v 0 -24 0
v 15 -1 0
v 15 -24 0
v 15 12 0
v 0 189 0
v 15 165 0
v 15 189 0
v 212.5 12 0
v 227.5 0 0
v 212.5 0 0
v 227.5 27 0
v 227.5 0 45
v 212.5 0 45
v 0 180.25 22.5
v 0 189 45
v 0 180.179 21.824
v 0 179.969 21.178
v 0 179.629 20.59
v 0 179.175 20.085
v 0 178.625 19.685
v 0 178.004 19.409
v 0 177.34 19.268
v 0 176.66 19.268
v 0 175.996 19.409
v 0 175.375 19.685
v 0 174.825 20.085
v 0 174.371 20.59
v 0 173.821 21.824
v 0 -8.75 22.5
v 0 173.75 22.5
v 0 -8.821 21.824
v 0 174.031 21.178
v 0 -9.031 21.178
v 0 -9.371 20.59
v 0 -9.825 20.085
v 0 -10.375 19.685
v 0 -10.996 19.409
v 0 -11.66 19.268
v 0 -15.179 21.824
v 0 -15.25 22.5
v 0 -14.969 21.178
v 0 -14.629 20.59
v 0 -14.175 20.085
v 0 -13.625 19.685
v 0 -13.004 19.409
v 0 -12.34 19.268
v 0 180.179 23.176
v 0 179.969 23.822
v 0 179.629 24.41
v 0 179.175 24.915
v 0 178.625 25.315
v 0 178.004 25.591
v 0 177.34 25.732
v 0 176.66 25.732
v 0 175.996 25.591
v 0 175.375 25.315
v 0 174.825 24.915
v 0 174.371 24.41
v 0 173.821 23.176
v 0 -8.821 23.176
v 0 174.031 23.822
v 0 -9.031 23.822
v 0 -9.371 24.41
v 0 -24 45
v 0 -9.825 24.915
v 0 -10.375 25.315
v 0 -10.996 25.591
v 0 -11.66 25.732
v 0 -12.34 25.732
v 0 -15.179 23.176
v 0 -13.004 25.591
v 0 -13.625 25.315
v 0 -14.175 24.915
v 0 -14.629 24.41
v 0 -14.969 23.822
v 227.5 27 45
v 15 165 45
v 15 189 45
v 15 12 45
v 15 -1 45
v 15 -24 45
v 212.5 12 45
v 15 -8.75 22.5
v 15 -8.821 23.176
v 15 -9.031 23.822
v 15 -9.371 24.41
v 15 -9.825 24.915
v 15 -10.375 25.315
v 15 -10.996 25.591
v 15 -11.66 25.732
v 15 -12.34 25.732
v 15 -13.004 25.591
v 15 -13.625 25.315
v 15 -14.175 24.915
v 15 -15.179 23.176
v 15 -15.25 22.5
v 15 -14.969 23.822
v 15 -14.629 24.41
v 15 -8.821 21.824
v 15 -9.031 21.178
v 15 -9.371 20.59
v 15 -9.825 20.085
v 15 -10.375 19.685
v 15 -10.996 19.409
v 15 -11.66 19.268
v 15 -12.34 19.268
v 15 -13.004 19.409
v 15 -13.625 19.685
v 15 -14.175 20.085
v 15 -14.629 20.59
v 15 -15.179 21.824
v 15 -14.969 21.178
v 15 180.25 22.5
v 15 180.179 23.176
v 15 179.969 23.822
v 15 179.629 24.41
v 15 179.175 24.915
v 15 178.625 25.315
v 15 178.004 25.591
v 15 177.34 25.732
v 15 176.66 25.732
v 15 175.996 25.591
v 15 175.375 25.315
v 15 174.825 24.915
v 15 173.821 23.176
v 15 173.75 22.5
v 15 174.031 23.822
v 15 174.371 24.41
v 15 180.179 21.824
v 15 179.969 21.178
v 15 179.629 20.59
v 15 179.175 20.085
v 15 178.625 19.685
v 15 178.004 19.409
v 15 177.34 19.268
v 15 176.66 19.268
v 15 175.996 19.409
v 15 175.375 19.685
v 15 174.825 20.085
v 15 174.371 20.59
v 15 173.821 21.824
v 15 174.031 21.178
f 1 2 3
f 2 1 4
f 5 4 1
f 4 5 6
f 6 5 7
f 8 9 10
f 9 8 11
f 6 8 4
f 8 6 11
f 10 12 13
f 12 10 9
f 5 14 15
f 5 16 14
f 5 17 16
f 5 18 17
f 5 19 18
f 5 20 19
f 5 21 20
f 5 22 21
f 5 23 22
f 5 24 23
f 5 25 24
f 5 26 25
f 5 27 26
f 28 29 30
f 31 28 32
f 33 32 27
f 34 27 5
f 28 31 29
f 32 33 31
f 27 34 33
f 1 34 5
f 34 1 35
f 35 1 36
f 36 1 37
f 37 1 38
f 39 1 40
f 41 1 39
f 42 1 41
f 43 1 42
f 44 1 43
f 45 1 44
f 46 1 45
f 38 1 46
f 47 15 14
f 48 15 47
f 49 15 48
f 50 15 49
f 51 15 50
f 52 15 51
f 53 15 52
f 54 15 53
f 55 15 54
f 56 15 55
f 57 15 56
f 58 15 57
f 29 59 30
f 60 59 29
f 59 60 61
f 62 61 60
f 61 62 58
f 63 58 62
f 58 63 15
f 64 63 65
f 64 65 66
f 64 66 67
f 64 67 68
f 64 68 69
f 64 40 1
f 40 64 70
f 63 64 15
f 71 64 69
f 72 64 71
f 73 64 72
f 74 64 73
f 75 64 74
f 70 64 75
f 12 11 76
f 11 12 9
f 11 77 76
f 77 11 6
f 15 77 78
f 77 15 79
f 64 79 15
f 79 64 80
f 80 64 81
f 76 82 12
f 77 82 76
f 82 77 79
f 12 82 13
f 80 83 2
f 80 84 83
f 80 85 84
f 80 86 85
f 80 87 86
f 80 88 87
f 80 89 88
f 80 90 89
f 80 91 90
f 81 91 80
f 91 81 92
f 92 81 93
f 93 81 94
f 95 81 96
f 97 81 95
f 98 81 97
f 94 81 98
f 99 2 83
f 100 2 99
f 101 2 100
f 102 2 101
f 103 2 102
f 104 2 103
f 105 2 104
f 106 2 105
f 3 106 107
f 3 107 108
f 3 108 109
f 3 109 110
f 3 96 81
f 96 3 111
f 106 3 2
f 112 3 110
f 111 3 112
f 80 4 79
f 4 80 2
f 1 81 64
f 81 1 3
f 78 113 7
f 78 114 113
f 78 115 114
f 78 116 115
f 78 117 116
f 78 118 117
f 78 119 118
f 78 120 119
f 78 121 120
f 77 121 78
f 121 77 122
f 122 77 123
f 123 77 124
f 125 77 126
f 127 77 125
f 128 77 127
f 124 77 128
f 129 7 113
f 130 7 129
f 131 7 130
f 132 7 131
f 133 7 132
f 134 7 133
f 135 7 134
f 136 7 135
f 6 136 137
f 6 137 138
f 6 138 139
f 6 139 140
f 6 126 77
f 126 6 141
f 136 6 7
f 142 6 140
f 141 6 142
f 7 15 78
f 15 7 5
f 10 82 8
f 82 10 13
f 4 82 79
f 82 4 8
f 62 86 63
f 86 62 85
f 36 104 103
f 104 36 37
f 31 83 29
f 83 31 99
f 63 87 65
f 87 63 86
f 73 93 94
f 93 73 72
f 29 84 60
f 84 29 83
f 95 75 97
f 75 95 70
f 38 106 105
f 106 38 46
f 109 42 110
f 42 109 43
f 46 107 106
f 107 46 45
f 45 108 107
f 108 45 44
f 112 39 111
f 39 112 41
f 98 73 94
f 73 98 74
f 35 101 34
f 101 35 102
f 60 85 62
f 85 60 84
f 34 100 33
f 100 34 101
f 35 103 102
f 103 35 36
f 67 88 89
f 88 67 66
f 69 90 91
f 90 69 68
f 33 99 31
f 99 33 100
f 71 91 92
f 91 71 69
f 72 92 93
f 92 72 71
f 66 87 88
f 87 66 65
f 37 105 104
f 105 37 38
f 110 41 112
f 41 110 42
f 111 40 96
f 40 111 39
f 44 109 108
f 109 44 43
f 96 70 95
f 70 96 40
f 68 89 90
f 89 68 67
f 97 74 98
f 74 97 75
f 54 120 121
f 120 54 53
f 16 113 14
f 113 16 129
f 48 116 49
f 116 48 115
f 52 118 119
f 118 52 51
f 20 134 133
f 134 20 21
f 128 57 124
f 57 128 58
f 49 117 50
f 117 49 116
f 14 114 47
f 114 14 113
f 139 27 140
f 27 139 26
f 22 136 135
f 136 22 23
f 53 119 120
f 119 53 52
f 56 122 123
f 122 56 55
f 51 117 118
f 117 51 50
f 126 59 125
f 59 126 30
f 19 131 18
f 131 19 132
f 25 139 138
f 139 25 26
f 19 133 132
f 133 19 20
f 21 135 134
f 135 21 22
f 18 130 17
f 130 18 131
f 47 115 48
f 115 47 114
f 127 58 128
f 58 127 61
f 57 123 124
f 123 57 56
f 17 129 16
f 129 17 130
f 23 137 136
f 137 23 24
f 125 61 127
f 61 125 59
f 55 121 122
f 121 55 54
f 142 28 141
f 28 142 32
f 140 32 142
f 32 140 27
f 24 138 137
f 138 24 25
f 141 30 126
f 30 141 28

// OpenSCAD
/*
  Floor Tile Shelf Bracket / Support
  Version: HEAVY-DUTY SOLID WEDGE + MINIMAL MOUNTING TABS
  Optimized size: 227.5 x 213 mm (Fits a 235x235 bed at 100% scale)
*/

// ==========================================
// --- TILE AND POSITIONING PARAMETERS ---
// ==========================================
tile_nominal_width = 195;    // Nominal width of the tile (19.5 cm)
shrinkage_clearance = 2.5;   // Plastic shrinkage compensation / tolerance
tile_width = tile_nominal_width + shrinkage_clearance; 
tile_thickness = 10;         // Thickness of the tile (1 cm)

// ==========================================
// --- BRACKET DESIGN PARAMETERS ---
// ==========================================
bracket_width = 45;          // Overall width/thickness of the printed bracket (4.5 cm) 
wall_base_thickness = 15;    // Thickness of the base resting against the wall

// Tile sits flush with the back section
wall_offset = wall_base_thickness; 

front_arm_thickness = 27;    // Thickness of the base at the very front (under the retaining lip)
recess_depth = 12;           // Depth of the groove holding the tile
front_lip = 15;              // Front retaining lip to secure the tile in place

// --- NEW PROPORTIONS (SOLID WEDGE) ---
wedge_height = 165;          // Height of the main supporting wedge against the wall
top_tab_height = 24;         // Minimal top mounting tab (just enough for the washer/hole)
bottom_tab_height = 24;      // Minimal bottom mounting tab (just enough for the washer/hole)

// ==========================================
// --- SCREW MOUNTING PARAMETERS ---
// ==========================================
hole_diameter = 6.5;         // Large hole for a 6mm screw with a flat washer
hole_margin = 12;            // Safe distance from the hole center to the edge of the tab

// --- AUXILIARY CALCULATIONS ---
total_length = wall_offset + tile_width + front_lip;

// Model rotated on its side (ready for 3D printing)
rotate([90, 0, 0])
shelf_bracket();

// ==========================================
// --- MAIN GENERATOR MODULE ---
// ==========================================
module shelf_bracket() {
    difference() {
        // 1. MAIN BODY (MASSIVE WEDGE + MOUNTING TABS)
        union() {
            // MAIN SUPPORT WEDGE (Covers the entire space under the tile)
            hull() {
                // Wall block (from the flat top to the very bottom of the wedge)
                translate([0, 0, -wedge_height])
                    cube([wall_base_thickness, bracket_width, wedge_height]);
                
                // Front end block (retaining lip and its direct support)
                translate([total_length - front_lip, 0, -front_arm_thickness])
                    cube([front_lip, bracket_width, front_arm_thickness]);
            }

            // TOP MOUNTING TAB (Minimal, just to fit the screw)
            translate([0, 0, 0])
                cube([wall_base_thickness, bracket_width, top_tab_height]);

            // BOTTOM MOUNTING TAB (Minimal, just to fit the screw)
            translate([0, 0, -wedge_height - bottom_tab_height])
                cube([wall_base_thickness, bracket_width, bottom_tab_height]);
        }

        // 2. CUTOUTS
        
        // Tile recess (Creates a perfect groove routed into the top of the wedge)
        translate([wall_offset, -1, -recess_depth])
            cube([tile_width, bracket_width + 2, recess_depth + 1]);

        // ==========================================
        // --- MOUNTING HOLES (FLAT) ---
        // ==========================================
        
        // TOP HOLE - perfectly centered on the minimal tab
        screw_hole(0, bracket_width/2, top_tab_height - hole_margin); 

        // BOTTOM HOLE - perfectly centered on the minimal tab
        screw_hole(0, bracket_width/2, -wedge_height - bottom_tab_height + hole_margin);
    }
}

// Module carving a simple through-hole for a screw and washer
module screw_hole(x, y, z) {
    translate([x, y, z]) rotate([0, 90, 0]) {
        // Basic through-hole cylinder
        translate([0, 0, -10])
            cylinder(h=wall_base_thickness+30, d=hole_diameter, $fn=30);
    }
}
